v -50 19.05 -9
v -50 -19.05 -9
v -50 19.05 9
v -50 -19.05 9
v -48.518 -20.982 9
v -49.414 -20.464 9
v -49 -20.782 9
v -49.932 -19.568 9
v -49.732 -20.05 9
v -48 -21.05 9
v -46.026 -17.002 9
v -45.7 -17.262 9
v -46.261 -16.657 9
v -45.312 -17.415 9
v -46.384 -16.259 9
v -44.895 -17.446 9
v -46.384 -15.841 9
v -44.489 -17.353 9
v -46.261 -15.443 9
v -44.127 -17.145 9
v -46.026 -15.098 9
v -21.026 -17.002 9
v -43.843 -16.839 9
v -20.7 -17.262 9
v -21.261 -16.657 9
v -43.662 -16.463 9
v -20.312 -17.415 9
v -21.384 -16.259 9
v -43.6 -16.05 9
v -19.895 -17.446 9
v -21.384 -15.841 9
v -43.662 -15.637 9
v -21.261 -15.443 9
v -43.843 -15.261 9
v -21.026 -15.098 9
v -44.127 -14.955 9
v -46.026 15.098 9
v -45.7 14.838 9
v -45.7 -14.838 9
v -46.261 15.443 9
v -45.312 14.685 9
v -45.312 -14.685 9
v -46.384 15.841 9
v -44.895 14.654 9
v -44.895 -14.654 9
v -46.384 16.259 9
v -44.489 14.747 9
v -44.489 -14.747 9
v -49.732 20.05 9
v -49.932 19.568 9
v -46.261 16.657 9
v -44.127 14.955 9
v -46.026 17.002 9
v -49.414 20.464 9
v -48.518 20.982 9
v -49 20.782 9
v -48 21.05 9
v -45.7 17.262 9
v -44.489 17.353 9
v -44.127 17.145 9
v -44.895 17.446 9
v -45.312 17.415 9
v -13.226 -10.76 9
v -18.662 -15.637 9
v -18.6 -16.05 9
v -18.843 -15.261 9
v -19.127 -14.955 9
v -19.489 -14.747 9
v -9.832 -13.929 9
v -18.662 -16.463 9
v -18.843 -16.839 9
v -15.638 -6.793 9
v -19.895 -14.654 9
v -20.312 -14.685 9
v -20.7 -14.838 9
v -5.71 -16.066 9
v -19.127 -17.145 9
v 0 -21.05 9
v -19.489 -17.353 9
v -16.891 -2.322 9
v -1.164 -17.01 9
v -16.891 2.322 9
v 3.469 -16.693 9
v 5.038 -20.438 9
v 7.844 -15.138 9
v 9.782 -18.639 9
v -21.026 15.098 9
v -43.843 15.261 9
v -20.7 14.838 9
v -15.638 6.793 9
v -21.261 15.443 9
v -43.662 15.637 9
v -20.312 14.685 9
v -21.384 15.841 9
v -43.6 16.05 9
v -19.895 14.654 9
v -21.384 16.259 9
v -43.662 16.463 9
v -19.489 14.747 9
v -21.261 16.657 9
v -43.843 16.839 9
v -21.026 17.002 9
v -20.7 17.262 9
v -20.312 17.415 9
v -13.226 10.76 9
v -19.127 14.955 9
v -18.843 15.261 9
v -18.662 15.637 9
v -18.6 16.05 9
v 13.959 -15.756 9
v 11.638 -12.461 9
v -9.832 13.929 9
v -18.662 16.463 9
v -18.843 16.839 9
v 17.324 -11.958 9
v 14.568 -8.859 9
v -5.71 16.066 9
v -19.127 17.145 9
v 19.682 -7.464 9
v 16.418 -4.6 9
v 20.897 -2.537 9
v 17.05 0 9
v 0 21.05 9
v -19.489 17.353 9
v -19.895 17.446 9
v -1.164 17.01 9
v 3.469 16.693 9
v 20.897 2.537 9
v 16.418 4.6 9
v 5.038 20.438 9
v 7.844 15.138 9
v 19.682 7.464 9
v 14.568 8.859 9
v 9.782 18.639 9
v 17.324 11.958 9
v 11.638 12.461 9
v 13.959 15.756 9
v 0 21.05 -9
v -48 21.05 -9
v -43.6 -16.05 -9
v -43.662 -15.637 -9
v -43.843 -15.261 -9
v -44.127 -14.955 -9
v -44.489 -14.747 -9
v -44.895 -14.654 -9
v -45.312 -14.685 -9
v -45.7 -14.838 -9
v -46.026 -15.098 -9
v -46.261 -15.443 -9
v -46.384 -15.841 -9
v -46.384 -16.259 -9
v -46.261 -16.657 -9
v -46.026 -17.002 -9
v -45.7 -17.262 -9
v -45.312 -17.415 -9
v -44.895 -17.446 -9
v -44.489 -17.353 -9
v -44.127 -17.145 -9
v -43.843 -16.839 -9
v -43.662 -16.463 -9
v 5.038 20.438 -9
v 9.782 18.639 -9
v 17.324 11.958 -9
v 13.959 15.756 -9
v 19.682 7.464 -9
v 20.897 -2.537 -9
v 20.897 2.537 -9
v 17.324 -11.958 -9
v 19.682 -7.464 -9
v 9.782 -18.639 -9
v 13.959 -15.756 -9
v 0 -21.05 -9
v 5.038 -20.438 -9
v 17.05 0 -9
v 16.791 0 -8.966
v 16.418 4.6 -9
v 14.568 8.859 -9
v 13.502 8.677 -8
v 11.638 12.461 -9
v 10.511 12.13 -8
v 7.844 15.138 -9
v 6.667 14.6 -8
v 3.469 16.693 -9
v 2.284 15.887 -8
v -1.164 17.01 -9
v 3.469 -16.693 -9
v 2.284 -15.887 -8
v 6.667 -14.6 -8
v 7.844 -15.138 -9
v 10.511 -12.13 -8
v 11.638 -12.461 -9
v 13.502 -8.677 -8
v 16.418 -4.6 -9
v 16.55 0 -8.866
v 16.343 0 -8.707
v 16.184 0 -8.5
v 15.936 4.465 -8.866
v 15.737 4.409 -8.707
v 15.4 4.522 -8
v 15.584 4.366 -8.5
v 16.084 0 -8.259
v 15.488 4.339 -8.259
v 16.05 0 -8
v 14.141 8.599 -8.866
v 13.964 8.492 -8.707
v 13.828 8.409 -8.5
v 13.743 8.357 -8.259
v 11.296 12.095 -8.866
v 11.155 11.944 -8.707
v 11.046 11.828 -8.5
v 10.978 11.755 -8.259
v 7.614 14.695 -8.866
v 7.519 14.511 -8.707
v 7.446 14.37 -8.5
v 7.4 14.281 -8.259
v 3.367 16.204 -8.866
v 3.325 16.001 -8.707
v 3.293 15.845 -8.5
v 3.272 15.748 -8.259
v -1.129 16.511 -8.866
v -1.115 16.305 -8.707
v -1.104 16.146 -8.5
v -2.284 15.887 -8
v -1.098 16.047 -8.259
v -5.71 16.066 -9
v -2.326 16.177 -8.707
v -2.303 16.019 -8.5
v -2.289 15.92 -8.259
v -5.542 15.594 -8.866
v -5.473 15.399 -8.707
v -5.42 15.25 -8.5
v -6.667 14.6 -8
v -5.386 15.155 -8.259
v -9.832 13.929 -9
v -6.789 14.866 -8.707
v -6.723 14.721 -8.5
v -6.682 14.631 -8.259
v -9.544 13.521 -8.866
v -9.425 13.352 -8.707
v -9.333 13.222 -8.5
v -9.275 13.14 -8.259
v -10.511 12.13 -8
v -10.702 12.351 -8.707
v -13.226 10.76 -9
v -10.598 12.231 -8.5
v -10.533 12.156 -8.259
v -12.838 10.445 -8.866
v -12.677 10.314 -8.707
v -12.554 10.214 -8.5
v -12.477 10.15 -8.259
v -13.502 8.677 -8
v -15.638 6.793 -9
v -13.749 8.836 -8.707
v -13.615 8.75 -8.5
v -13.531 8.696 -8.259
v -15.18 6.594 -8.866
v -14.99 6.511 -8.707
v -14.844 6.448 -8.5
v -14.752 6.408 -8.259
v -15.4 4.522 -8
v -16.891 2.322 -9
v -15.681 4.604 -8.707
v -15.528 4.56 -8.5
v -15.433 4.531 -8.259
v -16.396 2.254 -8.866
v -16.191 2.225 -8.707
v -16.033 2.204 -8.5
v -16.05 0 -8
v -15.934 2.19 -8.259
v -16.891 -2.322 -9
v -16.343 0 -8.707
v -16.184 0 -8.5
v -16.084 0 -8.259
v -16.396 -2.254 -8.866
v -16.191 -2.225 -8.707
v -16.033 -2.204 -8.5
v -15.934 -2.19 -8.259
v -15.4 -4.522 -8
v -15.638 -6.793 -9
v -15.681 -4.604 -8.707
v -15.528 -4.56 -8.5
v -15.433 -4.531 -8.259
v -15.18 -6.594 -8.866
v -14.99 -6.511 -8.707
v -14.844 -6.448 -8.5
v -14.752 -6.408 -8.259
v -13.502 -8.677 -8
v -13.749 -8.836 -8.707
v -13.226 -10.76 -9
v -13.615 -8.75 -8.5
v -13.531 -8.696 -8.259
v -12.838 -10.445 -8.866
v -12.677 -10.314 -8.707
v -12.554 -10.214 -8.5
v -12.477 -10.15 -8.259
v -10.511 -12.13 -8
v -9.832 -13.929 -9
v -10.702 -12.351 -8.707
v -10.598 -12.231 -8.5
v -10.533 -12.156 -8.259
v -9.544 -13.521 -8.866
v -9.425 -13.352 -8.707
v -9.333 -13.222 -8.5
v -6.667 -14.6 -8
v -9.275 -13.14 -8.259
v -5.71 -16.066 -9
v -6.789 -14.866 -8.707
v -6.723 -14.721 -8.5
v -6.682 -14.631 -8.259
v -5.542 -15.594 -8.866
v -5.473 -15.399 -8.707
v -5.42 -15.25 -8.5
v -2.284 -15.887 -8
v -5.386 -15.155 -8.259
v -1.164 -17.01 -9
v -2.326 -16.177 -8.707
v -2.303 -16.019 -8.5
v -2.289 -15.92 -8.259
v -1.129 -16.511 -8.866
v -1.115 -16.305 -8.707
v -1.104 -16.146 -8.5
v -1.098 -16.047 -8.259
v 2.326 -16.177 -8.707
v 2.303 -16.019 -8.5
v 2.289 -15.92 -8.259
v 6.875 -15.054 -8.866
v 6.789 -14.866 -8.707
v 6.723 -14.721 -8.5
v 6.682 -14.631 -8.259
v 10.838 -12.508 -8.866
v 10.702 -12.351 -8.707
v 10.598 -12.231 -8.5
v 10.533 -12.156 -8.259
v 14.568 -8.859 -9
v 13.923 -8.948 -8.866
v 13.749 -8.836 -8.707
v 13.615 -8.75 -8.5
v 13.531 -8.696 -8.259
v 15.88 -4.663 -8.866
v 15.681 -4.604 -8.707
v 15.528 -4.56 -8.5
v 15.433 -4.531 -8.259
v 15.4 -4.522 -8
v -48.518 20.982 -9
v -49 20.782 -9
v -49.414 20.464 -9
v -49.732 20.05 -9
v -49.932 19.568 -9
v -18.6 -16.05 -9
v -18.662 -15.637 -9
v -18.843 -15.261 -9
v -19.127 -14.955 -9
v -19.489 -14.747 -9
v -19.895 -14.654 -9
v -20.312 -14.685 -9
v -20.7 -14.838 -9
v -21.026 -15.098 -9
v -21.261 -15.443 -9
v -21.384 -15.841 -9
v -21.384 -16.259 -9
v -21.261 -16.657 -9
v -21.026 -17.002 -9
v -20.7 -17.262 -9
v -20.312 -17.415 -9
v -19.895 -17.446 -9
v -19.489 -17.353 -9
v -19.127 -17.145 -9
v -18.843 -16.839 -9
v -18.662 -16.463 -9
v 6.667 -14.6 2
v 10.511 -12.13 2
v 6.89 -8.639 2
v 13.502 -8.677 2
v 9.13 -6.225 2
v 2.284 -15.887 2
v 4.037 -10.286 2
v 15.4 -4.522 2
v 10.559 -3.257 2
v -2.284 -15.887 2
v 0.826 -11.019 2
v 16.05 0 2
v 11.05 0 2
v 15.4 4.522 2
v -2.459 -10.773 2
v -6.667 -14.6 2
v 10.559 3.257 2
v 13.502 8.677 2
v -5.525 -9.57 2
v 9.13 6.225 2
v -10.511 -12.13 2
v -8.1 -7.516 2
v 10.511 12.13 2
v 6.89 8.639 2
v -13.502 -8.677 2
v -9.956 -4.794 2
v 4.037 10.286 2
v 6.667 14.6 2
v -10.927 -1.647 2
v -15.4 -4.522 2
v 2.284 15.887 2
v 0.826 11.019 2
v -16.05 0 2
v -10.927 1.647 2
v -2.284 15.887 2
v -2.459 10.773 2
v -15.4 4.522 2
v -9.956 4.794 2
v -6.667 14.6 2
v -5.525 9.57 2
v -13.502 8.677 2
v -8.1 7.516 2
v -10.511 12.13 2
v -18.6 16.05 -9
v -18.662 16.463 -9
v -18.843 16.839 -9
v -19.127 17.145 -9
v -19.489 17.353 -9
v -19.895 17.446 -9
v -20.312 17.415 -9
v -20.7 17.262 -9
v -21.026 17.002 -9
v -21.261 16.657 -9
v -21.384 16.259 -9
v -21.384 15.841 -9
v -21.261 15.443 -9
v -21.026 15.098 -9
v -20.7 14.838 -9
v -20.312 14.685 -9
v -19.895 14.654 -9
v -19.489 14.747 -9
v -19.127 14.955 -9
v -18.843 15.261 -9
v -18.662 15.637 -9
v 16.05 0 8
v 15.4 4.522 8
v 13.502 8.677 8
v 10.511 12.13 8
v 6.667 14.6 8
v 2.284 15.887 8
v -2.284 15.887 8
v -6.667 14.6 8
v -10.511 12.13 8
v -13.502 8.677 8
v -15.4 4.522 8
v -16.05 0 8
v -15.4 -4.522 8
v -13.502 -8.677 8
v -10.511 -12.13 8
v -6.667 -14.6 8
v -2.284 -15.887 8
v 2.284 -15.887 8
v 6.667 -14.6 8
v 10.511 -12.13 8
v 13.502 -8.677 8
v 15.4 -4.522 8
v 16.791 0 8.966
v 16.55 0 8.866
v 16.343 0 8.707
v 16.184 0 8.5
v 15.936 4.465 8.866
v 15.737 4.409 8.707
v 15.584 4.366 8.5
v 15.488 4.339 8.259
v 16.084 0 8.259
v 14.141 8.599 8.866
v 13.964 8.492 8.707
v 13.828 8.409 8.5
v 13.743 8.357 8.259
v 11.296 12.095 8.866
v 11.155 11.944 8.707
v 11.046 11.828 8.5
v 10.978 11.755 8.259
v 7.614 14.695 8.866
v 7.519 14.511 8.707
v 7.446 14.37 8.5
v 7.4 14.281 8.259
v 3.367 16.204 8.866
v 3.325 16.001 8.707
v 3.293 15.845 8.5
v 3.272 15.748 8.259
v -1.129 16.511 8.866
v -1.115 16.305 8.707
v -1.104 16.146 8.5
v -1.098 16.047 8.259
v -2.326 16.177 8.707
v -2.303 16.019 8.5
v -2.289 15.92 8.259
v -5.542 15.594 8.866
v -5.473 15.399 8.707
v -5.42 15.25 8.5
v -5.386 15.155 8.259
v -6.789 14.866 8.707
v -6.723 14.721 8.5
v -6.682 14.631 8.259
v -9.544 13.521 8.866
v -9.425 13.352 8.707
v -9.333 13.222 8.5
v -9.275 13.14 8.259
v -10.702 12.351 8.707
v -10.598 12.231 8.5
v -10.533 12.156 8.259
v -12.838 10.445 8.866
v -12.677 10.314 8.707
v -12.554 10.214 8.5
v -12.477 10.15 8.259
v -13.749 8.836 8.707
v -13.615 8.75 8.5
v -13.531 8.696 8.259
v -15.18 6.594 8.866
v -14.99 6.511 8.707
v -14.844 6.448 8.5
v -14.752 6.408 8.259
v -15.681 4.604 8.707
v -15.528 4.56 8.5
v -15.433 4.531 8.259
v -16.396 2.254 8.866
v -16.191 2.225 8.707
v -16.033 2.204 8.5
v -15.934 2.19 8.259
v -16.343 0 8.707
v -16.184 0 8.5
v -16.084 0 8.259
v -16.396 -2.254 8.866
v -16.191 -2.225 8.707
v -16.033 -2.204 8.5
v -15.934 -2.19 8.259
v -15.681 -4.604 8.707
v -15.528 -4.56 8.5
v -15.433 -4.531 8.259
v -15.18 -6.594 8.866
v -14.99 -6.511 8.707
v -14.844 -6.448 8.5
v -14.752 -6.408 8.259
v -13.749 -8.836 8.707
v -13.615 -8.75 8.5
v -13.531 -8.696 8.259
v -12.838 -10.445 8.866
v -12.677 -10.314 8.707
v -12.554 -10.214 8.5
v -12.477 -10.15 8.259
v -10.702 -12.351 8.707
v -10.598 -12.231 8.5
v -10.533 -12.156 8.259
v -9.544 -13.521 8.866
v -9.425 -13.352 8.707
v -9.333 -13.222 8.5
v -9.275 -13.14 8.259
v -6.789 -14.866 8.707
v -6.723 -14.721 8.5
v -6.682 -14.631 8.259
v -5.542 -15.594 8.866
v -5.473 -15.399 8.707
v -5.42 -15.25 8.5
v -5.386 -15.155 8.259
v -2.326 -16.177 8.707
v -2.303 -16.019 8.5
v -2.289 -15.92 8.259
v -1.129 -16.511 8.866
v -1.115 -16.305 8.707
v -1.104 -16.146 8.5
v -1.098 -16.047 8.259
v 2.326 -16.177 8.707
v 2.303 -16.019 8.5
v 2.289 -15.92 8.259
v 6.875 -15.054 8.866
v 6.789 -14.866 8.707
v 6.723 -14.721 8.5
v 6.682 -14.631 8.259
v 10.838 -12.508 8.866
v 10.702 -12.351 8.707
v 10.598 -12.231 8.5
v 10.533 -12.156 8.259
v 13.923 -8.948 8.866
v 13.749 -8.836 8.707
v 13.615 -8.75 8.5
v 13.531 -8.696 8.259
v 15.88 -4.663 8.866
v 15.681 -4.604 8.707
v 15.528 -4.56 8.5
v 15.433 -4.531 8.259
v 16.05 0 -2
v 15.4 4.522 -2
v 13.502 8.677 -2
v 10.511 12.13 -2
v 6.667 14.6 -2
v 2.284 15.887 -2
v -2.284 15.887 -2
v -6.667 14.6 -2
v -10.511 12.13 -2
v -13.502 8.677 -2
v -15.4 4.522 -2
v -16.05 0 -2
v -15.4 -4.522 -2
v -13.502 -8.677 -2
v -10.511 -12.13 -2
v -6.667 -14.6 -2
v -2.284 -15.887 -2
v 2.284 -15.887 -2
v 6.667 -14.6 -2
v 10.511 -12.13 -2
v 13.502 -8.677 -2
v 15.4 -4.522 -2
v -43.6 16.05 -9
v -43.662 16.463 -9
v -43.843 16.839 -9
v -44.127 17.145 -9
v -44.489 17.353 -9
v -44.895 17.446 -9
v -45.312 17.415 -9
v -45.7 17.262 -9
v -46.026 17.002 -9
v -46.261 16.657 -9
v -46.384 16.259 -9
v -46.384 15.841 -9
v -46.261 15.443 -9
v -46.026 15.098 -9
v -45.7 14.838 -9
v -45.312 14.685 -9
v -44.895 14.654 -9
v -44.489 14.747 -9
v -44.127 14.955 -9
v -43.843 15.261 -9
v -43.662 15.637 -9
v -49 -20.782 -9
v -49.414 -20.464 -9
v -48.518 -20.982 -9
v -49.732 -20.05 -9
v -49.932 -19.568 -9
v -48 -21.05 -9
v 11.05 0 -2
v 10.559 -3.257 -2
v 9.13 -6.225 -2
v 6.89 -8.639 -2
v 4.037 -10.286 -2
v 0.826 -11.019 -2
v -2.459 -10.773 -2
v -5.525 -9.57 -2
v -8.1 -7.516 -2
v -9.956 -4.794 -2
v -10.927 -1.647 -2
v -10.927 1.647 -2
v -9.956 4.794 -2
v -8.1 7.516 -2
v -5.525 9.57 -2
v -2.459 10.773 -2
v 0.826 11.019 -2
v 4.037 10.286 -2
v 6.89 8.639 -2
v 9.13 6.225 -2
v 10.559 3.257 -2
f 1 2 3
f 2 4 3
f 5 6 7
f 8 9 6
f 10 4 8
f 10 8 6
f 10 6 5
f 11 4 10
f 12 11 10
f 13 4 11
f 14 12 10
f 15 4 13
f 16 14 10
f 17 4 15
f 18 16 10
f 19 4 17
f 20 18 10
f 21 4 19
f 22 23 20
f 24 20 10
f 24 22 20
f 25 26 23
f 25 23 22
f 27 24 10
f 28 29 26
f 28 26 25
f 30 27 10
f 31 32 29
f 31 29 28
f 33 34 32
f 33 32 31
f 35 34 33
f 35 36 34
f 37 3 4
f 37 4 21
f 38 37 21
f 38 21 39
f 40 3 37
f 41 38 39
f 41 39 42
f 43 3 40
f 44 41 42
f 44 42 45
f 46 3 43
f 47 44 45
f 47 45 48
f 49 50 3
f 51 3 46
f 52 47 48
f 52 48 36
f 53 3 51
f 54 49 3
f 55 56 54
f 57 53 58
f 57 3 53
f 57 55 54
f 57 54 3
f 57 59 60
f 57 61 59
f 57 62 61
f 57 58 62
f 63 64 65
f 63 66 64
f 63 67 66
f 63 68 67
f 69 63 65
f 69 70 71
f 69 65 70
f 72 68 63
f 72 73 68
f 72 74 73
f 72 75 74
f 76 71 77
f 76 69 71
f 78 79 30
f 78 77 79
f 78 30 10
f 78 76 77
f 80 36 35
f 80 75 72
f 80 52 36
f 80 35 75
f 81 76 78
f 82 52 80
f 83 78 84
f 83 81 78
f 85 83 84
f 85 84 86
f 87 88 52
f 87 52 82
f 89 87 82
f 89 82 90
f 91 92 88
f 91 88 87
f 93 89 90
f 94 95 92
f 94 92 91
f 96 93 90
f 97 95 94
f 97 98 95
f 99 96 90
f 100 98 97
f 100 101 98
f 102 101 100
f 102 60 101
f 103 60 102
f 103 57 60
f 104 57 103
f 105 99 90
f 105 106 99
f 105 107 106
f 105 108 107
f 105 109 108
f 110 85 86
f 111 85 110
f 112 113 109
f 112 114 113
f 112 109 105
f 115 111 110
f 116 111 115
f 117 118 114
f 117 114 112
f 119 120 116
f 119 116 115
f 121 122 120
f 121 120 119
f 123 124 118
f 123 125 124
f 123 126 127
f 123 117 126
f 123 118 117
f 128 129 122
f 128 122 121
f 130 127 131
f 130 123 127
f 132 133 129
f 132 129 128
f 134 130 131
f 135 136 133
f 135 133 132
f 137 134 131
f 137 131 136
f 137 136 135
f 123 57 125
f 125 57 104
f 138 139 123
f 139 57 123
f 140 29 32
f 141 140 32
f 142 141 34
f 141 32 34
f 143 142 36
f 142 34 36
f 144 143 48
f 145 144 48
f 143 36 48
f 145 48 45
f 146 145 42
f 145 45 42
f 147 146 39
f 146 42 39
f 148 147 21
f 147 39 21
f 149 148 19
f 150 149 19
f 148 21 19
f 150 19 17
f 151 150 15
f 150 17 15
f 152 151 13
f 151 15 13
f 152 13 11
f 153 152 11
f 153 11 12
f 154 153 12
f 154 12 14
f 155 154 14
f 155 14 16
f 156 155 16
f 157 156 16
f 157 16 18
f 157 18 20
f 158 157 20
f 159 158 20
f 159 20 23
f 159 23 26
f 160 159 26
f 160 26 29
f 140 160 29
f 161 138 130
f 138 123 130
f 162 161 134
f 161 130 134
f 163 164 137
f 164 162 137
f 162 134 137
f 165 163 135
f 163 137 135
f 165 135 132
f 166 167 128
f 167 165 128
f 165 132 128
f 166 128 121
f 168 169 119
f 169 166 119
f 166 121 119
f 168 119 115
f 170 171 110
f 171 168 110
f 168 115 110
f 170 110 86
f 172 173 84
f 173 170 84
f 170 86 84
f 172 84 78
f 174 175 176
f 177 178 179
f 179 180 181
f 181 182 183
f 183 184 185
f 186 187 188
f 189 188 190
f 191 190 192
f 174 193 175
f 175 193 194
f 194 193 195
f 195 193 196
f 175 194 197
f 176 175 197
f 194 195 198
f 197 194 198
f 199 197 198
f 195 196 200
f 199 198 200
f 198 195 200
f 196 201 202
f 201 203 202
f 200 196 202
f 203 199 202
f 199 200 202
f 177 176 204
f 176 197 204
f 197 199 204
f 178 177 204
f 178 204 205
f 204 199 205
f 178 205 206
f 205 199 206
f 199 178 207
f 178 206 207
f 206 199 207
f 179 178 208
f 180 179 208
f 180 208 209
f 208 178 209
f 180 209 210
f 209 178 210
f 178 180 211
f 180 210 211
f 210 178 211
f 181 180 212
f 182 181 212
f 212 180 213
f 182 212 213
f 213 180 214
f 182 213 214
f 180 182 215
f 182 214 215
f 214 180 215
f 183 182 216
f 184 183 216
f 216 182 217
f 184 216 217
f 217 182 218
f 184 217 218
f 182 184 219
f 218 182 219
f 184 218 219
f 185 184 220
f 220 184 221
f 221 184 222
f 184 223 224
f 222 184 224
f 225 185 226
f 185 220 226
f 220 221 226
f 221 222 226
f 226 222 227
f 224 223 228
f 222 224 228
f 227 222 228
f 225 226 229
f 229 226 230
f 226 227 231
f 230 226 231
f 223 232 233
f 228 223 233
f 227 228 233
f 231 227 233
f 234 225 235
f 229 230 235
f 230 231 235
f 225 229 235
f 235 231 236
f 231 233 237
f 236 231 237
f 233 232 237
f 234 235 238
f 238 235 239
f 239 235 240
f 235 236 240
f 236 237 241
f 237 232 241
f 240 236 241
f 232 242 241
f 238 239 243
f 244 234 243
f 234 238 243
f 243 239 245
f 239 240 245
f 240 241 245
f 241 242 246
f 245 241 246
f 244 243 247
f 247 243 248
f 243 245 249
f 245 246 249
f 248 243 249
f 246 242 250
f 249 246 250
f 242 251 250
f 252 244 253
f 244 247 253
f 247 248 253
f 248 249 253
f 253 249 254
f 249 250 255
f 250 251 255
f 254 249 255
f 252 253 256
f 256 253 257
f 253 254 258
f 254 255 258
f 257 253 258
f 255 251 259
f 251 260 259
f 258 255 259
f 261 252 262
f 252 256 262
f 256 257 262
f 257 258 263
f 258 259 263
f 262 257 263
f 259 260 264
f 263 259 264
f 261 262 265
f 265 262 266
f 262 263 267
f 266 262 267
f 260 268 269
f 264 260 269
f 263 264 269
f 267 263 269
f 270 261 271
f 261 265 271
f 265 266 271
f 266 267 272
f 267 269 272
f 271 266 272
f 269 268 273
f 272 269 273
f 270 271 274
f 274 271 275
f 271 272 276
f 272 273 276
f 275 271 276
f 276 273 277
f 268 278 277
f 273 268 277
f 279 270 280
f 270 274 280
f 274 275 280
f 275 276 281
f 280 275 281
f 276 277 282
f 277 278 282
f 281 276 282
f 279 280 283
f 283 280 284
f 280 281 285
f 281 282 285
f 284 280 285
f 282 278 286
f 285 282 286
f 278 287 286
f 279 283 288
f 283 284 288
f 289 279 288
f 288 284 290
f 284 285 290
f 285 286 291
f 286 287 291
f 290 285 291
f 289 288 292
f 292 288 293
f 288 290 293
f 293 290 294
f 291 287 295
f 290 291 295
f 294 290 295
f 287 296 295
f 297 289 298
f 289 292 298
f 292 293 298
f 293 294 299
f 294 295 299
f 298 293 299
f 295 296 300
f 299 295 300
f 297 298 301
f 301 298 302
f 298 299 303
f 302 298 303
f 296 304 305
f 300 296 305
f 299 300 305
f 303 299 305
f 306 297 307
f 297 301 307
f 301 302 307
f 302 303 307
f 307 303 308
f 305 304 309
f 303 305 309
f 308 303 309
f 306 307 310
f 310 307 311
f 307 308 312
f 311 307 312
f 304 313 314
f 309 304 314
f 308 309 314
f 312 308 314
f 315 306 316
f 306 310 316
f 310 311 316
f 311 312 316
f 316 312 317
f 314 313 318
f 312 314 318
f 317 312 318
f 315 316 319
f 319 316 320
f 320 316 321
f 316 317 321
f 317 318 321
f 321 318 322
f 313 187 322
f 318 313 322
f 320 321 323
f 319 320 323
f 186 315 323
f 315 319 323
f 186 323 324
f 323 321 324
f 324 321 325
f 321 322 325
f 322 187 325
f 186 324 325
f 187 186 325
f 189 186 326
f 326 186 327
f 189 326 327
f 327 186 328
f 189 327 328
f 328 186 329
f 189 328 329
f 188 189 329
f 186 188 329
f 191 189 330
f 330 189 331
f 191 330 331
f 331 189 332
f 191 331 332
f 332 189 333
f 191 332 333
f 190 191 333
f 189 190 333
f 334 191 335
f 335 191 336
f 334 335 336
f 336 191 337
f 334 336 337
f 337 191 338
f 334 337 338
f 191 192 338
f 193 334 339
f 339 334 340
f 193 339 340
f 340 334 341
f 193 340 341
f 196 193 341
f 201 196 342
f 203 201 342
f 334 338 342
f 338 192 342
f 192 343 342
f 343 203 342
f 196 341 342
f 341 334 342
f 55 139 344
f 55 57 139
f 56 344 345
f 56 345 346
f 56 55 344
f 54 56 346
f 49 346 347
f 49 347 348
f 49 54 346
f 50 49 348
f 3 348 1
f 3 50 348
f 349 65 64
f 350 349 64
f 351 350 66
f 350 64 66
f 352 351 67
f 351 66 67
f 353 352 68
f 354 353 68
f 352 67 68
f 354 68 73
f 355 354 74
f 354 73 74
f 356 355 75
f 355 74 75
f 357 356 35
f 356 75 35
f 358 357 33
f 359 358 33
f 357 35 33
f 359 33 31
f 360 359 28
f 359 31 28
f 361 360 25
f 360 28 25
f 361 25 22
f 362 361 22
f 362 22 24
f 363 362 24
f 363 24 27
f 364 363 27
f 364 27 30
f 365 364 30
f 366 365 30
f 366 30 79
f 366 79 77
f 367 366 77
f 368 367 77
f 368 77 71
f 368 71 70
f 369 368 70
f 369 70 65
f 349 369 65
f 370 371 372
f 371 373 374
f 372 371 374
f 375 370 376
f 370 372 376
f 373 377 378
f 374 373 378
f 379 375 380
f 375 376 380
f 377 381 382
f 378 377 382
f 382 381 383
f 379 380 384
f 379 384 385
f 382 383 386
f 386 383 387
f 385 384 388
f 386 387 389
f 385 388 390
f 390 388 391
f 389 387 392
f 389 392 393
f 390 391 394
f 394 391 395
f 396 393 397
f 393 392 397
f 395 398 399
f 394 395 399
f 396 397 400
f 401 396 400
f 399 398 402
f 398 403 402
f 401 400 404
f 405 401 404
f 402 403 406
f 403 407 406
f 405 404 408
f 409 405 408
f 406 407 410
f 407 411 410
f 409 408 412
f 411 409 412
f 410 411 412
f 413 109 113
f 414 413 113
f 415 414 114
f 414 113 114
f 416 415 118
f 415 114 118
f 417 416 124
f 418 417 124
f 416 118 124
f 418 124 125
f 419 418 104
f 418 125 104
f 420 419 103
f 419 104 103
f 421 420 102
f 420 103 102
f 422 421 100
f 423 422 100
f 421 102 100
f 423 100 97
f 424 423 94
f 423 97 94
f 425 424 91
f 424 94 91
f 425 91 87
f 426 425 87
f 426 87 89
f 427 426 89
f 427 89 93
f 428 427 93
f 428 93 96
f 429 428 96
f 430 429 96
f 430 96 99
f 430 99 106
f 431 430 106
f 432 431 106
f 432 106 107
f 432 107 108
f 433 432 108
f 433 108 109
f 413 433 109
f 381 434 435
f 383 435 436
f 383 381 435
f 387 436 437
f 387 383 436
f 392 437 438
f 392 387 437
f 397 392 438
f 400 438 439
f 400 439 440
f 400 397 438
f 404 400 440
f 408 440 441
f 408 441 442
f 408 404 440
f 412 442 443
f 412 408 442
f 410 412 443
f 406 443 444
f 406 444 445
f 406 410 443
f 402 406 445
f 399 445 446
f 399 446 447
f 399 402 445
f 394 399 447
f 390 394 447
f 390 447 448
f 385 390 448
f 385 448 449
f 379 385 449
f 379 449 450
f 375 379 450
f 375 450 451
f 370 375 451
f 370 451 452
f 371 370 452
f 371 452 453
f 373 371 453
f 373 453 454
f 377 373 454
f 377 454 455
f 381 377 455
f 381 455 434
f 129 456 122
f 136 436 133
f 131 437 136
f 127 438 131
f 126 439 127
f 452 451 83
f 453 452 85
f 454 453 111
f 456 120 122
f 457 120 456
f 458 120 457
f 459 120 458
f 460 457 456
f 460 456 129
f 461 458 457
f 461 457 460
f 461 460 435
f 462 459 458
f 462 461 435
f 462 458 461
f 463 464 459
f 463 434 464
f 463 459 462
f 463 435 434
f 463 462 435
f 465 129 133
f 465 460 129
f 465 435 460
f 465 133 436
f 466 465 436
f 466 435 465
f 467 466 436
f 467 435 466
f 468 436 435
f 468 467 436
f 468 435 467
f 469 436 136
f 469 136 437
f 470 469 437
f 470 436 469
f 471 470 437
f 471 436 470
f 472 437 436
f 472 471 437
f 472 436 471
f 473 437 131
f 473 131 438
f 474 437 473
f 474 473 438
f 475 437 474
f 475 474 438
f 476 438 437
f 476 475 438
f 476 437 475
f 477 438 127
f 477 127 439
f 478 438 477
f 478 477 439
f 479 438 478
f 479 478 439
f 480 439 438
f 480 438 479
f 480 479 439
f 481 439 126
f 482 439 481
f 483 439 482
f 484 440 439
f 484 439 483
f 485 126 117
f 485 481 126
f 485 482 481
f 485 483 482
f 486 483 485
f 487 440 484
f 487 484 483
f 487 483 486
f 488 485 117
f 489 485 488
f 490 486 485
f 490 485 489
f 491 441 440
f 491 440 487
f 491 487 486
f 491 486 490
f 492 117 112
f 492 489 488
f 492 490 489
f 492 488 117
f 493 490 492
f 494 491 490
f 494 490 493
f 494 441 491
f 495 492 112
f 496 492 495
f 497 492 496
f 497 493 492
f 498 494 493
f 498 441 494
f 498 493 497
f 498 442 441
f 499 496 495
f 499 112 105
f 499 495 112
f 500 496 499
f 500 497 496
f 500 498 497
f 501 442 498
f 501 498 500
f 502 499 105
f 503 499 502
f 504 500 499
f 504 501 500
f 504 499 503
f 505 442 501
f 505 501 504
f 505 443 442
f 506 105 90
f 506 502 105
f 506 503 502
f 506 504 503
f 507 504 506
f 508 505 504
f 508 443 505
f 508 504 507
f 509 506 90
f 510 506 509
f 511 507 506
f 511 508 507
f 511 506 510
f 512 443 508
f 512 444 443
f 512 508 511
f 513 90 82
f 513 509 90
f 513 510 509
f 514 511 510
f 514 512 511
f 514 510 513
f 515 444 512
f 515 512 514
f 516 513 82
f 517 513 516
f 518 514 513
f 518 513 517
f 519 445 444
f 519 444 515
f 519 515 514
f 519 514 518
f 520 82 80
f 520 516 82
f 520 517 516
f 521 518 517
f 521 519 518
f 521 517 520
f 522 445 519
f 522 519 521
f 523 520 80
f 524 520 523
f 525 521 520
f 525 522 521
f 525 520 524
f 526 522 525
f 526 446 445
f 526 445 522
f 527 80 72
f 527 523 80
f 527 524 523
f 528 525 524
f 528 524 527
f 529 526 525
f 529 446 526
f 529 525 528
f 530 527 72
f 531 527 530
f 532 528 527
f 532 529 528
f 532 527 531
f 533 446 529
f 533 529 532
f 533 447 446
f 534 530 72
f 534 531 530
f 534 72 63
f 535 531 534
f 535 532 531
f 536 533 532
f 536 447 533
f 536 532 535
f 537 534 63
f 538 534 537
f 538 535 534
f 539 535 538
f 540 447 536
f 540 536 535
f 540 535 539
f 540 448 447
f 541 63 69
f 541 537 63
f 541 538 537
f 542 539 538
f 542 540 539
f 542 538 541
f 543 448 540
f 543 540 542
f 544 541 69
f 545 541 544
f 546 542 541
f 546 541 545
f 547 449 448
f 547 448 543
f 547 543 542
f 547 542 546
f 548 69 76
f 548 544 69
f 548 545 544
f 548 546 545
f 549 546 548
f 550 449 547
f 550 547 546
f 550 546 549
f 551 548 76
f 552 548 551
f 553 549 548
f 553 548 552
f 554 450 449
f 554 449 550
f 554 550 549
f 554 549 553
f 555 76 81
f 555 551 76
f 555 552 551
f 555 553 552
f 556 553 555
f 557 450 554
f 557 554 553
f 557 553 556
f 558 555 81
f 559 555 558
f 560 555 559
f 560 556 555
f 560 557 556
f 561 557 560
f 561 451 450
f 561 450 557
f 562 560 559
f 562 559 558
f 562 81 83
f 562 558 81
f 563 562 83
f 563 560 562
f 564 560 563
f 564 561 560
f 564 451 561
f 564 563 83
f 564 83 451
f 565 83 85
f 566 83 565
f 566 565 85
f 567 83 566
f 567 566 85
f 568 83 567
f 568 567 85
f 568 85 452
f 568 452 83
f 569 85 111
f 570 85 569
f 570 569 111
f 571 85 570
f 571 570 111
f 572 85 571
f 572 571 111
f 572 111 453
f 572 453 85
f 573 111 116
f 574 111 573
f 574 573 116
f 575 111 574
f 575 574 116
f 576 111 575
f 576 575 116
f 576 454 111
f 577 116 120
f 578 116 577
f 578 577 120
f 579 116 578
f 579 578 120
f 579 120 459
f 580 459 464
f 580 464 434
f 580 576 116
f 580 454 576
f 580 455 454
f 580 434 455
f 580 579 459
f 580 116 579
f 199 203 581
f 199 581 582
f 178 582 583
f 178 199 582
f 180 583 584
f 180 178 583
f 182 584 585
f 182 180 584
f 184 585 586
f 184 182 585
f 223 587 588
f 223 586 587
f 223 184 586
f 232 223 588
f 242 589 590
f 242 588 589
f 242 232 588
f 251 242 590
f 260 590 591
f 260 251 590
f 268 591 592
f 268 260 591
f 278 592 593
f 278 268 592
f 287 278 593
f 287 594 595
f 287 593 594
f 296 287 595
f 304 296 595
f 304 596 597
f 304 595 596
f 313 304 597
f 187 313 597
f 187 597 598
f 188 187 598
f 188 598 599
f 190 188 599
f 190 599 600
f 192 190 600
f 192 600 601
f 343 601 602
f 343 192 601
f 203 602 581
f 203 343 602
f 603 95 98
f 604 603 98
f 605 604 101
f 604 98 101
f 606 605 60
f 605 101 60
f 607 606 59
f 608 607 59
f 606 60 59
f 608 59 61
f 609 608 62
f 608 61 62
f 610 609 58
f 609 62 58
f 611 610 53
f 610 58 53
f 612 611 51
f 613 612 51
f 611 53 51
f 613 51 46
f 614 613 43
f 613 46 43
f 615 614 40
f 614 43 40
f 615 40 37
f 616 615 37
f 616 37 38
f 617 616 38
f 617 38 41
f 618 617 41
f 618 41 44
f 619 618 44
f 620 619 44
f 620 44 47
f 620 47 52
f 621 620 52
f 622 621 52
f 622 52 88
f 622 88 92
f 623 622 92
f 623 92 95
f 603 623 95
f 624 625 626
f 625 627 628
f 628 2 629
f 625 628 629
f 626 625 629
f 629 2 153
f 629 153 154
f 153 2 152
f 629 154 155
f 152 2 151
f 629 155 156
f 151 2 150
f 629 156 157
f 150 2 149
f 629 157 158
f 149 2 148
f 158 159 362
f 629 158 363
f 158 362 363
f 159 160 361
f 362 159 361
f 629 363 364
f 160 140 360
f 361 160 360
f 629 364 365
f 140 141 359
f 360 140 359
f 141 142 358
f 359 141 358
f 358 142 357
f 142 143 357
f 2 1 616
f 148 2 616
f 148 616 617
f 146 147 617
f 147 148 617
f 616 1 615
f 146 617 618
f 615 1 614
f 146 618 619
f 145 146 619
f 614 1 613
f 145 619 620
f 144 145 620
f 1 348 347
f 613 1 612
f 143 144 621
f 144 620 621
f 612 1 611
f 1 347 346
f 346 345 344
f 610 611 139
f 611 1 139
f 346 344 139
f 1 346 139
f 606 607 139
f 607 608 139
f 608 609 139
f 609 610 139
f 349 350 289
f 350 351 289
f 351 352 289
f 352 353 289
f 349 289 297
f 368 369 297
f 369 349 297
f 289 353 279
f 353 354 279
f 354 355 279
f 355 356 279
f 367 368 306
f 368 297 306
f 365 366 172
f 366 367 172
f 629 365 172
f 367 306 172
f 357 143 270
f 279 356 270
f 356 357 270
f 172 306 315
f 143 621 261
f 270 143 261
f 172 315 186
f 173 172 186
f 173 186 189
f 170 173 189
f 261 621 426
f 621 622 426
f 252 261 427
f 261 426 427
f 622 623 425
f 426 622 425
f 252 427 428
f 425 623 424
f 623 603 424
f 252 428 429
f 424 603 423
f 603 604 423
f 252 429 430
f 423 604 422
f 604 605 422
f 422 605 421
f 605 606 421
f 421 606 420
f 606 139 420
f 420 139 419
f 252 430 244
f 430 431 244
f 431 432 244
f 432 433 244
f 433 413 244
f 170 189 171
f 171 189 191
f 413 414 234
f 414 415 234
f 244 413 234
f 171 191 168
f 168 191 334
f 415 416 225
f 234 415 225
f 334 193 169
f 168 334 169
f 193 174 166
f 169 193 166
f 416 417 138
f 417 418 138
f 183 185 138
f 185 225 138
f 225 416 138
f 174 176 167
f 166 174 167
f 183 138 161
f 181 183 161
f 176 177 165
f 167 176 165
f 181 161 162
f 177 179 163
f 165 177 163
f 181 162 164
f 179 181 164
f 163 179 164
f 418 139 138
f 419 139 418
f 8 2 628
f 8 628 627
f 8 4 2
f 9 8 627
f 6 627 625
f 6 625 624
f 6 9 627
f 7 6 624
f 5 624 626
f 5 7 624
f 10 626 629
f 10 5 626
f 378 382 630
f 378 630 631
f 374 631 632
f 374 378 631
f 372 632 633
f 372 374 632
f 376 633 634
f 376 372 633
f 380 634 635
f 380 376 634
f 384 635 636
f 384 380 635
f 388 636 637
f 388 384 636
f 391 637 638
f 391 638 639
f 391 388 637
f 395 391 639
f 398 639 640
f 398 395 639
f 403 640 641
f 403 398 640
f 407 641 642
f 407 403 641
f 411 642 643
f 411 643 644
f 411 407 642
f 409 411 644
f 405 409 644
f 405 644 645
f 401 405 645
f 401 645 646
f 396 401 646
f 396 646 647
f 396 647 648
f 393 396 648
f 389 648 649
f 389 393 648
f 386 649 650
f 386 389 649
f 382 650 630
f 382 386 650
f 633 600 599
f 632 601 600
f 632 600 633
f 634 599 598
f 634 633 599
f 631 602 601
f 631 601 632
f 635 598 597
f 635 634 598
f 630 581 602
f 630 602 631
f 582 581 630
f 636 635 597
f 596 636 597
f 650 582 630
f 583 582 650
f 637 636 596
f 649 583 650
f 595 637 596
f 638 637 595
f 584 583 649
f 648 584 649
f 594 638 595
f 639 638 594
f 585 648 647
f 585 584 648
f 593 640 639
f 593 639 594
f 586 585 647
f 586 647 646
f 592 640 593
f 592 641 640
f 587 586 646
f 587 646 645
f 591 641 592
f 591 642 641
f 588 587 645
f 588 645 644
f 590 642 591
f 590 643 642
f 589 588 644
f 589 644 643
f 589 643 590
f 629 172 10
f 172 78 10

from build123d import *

# Parameters (mm, degrees)
BOSS_EXTRUDE1_DEPTH      = 9
BOSS_EXTRUDE1_DEPTH_BACK = 9
SKETCH1_R                = 16.05
BOSS_EXTRUDE2_DEPTH      = 2
BOSS_EXTRUDE2_DEPTH_BACK = 2
SKETCH2_R                = 11.05
SKETCH3_R                = 1.4
CUT_EXTRUDE1_DEPTH       = 58.158573285
FILLET1_R                = 2
FILLET2_R                = 1


with BuildPart() as part:
    # Sketch1 → Boss-Extrude1 (new, two sides: drawn at the far end of the back side and taken through both)
    with BuildSketch(Plane.XY.offset(-BOSS_EXTRUDE1_DEPTH_BACK)):
        with BuildLine():
            Line((0, 21.05), (-50, 21.05))
            Line((-50, 21.05), (-50, -21.05))
            Line((-50, -21.05), (0, -21.05))
            ThreePointArc((0, -21.05), (21.05, 0), (0, 21.05))
        make_face()
        Circle(SKETCH1_R, mode=Mode.SUBTRACT)
    extrude(amount=BOSS_EXTRUDE1_DEPTH + BOSS_EXTRUDE1_DEPTH_BACK)

    # Sketch2 → Boss-Extrude2 (add, two sides: drawn at the far end of the back side and taken through both)
    with BuildSketch(Plane(origin=(0, 0, 0), x_dir=(-1, 0, 0), z_dir=(0, 0, -1)).offset(-BOSS_EXTRUDE2_DEPTH_BACK)):
        with BuildLine():
            Line((0, -21.05), (50, -21.05))
            Line((50, -21.05), (50, 21.05))
            Line((50, 21.05), (0, 21.05))
            ThreePointArc((0, 21.05), (-21.05, 0), (0, -21.05))
        make_face()
        with Locations(Location((0, 0, 0), (0, 0, 180))):
            Circle(SKETCH2_R, mode=Mode.SUBTRACT)
    extrude(amount=BOSS_EXTRUDE2_DEPTH + BOSS_EXTRUDE2_DEPTH_BACK)

    # Sketch3 → Cut-Extrude1 (cut, through all)
    with BuildSketch(Plane.XY.offset(9)):
        with Locations((-45, 16.05)):
            Circle(SKETCH3_R)
        with Locations((-20, 16.05)):
            Circle(SKETCH3_R)
        with Locations((-20, -16.05)):
            Circle(SKETCH3_R)
        with Locations((-45, -16.05)):
            Circle(SKETCH3_R)
    extrude(amount=-CUT_EXTRUDE1_DEPTH, mode=Mode.SUBTRACT)

    # Fillet1
    fillet1_edges = [part.edges().sort_by_distance(p)[0] for p in [
        (-50, -21.05, 0),
        (-50, 21.05, 0),
    ]]
    fillet(fillet1_edges, radius=FILLET1_R)

    # Fillet2
    fillet2_edges = [part.edges().sort_by_distance(p)[0] for p in [
        (-16.05, 0, -9),
        (-16.05, 0, 9),
    ]]
    fillet(fillet2_edges, radius=FILLET2_R)


solid = part.part
